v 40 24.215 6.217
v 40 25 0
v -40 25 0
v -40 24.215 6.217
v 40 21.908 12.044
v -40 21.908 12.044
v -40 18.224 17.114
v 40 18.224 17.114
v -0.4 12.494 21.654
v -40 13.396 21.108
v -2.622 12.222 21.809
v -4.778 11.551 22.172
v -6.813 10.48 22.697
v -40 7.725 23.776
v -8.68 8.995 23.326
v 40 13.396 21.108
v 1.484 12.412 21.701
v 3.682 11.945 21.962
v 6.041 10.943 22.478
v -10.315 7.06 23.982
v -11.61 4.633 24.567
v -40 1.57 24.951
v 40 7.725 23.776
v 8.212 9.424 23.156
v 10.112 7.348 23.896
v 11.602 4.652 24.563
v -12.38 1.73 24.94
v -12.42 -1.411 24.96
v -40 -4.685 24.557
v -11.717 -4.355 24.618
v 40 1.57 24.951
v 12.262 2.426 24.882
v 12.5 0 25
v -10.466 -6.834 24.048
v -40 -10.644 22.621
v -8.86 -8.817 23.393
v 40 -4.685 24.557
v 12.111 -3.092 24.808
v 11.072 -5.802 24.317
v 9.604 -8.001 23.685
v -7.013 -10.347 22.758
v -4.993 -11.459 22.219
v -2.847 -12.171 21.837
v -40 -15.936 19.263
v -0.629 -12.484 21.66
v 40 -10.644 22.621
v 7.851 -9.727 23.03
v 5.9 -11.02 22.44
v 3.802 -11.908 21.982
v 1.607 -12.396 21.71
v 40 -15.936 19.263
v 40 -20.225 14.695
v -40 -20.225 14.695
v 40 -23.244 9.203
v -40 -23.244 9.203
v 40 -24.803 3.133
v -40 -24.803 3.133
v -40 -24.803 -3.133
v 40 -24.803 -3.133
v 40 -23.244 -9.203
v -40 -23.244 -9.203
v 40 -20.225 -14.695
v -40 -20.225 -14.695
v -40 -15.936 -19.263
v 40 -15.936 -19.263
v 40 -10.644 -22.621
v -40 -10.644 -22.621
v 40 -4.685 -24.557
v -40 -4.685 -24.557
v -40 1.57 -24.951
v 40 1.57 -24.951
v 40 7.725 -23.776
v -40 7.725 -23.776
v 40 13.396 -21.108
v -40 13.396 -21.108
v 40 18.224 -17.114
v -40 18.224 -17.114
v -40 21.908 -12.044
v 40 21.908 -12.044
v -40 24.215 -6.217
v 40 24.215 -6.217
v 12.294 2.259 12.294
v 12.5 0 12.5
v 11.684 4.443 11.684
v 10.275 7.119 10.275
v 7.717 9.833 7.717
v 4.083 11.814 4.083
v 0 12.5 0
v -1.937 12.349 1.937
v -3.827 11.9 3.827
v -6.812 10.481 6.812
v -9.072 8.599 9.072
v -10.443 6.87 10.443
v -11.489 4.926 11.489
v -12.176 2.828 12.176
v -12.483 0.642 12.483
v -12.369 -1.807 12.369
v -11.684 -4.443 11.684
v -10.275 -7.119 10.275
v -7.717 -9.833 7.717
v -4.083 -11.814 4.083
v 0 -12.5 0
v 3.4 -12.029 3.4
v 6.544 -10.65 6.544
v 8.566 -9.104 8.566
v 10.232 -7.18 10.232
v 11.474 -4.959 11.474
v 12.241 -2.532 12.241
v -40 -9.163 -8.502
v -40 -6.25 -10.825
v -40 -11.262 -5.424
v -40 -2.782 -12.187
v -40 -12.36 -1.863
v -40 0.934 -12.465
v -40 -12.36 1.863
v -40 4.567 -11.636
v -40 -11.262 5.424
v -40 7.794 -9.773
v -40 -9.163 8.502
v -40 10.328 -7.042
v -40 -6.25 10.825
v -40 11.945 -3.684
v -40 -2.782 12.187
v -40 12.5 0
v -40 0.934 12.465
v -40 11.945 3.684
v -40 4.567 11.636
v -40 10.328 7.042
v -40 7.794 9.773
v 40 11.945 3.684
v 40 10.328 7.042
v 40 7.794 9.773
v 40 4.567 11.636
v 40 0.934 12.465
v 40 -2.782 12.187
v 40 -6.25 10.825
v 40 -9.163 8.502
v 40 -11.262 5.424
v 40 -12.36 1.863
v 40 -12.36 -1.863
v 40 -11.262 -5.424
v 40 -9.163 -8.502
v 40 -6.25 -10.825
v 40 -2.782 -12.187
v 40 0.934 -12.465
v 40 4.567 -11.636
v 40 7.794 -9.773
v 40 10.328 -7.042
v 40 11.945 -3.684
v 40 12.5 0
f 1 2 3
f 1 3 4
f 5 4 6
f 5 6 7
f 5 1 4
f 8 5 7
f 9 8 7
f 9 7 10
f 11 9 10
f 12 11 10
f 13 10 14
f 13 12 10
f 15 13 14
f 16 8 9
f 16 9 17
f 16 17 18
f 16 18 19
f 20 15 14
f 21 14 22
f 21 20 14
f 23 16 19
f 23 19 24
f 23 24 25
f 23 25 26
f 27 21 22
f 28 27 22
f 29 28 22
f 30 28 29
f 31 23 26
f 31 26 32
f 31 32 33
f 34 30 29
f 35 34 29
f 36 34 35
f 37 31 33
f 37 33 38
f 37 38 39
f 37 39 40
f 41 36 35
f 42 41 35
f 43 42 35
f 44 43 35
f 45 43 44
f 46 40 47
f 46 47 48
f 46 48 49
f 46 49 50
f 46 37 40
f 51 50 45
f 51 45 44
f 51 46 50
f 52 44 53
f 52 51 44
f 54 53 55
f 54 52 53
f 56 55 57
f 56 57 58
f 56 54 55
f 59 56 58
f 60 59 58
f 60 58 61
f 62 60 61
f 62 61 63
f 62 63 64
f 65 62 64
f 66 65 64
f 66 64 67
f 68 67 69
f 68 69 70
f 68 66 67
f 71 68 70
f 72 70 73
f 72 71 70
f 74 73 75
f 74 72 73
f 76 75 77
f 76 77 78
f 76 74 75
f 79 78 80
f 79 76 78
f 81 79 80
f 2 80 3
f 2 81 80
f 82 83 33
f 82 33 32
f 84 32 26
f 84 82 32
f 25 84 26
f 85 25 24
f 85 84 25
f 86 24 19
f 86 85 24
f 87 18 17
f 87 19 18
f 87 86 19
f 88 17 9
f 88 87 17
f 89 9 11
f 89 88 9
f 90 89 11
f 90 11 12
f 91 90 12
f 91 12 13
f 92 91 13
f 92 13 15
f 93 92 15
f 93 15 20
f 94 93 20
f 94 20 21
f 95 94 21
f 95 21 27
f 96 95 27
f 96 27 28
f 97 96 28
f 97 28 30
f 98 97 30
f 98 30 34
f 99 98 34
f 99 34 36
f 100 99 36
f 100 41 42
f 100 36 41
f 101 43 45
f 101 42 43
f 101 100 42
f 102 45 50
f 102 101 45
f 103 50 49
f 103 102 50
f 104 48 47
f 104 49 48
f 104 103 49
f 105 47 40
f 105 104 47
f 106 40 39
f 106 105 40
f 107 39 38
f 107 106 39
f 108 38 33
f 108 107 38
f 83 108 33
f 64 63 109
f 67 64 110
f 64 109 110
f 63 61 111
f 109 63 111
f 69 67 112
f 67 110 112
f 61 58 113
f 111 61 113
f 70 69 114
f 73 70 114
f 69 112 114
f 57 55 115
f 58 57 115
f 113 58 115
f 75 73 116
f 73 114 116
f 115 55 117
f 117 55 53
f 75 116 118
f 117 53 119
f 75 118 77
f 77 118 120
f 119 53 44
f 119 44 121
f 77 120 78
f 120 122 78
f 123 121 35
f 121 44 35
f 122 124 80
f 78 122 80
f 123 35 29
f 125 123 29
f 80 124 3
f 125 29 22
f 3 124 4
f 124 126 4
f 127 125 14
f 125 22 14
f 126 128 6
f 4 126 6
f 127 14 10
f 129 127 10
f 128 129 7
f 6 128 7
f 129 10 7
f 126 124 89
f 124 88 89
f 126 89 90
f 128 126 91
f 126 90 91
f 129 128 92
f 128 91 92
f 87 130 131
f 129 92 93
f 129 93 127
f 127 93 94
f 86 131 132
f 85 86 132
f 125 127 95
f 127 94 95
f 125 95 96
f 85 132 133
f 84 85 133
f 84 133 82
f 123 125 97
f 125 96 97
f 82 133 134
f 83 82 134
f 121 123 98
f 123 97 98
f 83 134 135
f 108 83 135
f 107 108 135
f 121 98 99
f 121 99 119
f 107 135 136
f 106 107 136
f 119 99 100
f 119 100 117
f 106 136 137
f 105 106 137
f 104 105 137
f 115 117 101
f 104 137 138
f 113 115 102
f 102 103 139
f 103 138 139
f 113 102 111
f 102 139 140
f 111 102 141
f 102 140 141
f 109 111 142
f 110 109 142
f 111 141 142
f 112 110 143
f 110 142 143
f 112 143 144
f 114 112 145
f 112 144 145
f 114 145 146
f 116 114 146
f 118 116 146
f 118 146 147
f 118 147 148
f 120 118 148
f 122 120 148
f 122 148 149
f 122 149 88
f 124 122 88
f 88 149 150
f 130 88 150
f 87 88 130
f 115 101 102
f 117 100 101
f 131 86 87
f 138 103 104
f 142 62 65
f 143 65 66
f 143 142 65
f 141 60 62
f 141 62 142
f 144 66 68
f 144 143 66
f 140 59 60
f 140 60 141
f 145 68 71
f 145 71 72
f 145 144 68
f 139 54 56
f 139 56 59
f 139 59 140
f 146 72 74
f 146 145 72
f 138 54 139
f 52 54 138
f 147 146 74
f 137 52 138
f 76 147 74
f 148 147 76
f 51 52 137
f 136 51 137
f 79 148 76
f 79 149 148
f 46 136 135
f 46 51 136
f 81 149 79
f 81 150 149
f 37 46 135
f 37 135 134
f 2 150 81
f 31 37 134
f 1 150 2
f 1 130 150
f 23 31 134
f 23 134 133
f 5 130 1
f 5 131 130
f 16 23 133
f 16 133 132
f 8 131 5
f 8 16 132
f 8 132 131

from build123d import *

# Parameters (mm, degrees)
F0_R          = 25
F1_DEPTH      = 40
F2_R          = 12.5
F3_DEPTH      = 25
F4_R          = 12.5
F5_DEPTH      = 40.001
F5_DEPTH_BACK = 40.001


with BuildPart() as f1:
    # F0 (on Right) → F1 (new body, symmetric)
    with BuildSketch(Plane.YZ):
        Circle(F0_R)
    extrude(amount=F1_DEPTH, both=True)

    # F2 (on Top) → F3 (cut)
    with BuildSketch(Plane.XY):
        Circle(F2_R)
    extrude(amount=F3_DEPTH, mode=Mode.SUBTRACT)

    # F4 (on Right) → F5 (cut, two sides)
    with BuildSketch(Plane.YZ) as f5_sk:
        Circle(F4_R)
    extrude(amount=F5_DEPTH, mode=Mode.SUBTRACT)
    extrude(f5_sk.sketch, amount=-F5_DEPTH_BACK, mode=Mode.SUBTRACT)


solid = f1.part
